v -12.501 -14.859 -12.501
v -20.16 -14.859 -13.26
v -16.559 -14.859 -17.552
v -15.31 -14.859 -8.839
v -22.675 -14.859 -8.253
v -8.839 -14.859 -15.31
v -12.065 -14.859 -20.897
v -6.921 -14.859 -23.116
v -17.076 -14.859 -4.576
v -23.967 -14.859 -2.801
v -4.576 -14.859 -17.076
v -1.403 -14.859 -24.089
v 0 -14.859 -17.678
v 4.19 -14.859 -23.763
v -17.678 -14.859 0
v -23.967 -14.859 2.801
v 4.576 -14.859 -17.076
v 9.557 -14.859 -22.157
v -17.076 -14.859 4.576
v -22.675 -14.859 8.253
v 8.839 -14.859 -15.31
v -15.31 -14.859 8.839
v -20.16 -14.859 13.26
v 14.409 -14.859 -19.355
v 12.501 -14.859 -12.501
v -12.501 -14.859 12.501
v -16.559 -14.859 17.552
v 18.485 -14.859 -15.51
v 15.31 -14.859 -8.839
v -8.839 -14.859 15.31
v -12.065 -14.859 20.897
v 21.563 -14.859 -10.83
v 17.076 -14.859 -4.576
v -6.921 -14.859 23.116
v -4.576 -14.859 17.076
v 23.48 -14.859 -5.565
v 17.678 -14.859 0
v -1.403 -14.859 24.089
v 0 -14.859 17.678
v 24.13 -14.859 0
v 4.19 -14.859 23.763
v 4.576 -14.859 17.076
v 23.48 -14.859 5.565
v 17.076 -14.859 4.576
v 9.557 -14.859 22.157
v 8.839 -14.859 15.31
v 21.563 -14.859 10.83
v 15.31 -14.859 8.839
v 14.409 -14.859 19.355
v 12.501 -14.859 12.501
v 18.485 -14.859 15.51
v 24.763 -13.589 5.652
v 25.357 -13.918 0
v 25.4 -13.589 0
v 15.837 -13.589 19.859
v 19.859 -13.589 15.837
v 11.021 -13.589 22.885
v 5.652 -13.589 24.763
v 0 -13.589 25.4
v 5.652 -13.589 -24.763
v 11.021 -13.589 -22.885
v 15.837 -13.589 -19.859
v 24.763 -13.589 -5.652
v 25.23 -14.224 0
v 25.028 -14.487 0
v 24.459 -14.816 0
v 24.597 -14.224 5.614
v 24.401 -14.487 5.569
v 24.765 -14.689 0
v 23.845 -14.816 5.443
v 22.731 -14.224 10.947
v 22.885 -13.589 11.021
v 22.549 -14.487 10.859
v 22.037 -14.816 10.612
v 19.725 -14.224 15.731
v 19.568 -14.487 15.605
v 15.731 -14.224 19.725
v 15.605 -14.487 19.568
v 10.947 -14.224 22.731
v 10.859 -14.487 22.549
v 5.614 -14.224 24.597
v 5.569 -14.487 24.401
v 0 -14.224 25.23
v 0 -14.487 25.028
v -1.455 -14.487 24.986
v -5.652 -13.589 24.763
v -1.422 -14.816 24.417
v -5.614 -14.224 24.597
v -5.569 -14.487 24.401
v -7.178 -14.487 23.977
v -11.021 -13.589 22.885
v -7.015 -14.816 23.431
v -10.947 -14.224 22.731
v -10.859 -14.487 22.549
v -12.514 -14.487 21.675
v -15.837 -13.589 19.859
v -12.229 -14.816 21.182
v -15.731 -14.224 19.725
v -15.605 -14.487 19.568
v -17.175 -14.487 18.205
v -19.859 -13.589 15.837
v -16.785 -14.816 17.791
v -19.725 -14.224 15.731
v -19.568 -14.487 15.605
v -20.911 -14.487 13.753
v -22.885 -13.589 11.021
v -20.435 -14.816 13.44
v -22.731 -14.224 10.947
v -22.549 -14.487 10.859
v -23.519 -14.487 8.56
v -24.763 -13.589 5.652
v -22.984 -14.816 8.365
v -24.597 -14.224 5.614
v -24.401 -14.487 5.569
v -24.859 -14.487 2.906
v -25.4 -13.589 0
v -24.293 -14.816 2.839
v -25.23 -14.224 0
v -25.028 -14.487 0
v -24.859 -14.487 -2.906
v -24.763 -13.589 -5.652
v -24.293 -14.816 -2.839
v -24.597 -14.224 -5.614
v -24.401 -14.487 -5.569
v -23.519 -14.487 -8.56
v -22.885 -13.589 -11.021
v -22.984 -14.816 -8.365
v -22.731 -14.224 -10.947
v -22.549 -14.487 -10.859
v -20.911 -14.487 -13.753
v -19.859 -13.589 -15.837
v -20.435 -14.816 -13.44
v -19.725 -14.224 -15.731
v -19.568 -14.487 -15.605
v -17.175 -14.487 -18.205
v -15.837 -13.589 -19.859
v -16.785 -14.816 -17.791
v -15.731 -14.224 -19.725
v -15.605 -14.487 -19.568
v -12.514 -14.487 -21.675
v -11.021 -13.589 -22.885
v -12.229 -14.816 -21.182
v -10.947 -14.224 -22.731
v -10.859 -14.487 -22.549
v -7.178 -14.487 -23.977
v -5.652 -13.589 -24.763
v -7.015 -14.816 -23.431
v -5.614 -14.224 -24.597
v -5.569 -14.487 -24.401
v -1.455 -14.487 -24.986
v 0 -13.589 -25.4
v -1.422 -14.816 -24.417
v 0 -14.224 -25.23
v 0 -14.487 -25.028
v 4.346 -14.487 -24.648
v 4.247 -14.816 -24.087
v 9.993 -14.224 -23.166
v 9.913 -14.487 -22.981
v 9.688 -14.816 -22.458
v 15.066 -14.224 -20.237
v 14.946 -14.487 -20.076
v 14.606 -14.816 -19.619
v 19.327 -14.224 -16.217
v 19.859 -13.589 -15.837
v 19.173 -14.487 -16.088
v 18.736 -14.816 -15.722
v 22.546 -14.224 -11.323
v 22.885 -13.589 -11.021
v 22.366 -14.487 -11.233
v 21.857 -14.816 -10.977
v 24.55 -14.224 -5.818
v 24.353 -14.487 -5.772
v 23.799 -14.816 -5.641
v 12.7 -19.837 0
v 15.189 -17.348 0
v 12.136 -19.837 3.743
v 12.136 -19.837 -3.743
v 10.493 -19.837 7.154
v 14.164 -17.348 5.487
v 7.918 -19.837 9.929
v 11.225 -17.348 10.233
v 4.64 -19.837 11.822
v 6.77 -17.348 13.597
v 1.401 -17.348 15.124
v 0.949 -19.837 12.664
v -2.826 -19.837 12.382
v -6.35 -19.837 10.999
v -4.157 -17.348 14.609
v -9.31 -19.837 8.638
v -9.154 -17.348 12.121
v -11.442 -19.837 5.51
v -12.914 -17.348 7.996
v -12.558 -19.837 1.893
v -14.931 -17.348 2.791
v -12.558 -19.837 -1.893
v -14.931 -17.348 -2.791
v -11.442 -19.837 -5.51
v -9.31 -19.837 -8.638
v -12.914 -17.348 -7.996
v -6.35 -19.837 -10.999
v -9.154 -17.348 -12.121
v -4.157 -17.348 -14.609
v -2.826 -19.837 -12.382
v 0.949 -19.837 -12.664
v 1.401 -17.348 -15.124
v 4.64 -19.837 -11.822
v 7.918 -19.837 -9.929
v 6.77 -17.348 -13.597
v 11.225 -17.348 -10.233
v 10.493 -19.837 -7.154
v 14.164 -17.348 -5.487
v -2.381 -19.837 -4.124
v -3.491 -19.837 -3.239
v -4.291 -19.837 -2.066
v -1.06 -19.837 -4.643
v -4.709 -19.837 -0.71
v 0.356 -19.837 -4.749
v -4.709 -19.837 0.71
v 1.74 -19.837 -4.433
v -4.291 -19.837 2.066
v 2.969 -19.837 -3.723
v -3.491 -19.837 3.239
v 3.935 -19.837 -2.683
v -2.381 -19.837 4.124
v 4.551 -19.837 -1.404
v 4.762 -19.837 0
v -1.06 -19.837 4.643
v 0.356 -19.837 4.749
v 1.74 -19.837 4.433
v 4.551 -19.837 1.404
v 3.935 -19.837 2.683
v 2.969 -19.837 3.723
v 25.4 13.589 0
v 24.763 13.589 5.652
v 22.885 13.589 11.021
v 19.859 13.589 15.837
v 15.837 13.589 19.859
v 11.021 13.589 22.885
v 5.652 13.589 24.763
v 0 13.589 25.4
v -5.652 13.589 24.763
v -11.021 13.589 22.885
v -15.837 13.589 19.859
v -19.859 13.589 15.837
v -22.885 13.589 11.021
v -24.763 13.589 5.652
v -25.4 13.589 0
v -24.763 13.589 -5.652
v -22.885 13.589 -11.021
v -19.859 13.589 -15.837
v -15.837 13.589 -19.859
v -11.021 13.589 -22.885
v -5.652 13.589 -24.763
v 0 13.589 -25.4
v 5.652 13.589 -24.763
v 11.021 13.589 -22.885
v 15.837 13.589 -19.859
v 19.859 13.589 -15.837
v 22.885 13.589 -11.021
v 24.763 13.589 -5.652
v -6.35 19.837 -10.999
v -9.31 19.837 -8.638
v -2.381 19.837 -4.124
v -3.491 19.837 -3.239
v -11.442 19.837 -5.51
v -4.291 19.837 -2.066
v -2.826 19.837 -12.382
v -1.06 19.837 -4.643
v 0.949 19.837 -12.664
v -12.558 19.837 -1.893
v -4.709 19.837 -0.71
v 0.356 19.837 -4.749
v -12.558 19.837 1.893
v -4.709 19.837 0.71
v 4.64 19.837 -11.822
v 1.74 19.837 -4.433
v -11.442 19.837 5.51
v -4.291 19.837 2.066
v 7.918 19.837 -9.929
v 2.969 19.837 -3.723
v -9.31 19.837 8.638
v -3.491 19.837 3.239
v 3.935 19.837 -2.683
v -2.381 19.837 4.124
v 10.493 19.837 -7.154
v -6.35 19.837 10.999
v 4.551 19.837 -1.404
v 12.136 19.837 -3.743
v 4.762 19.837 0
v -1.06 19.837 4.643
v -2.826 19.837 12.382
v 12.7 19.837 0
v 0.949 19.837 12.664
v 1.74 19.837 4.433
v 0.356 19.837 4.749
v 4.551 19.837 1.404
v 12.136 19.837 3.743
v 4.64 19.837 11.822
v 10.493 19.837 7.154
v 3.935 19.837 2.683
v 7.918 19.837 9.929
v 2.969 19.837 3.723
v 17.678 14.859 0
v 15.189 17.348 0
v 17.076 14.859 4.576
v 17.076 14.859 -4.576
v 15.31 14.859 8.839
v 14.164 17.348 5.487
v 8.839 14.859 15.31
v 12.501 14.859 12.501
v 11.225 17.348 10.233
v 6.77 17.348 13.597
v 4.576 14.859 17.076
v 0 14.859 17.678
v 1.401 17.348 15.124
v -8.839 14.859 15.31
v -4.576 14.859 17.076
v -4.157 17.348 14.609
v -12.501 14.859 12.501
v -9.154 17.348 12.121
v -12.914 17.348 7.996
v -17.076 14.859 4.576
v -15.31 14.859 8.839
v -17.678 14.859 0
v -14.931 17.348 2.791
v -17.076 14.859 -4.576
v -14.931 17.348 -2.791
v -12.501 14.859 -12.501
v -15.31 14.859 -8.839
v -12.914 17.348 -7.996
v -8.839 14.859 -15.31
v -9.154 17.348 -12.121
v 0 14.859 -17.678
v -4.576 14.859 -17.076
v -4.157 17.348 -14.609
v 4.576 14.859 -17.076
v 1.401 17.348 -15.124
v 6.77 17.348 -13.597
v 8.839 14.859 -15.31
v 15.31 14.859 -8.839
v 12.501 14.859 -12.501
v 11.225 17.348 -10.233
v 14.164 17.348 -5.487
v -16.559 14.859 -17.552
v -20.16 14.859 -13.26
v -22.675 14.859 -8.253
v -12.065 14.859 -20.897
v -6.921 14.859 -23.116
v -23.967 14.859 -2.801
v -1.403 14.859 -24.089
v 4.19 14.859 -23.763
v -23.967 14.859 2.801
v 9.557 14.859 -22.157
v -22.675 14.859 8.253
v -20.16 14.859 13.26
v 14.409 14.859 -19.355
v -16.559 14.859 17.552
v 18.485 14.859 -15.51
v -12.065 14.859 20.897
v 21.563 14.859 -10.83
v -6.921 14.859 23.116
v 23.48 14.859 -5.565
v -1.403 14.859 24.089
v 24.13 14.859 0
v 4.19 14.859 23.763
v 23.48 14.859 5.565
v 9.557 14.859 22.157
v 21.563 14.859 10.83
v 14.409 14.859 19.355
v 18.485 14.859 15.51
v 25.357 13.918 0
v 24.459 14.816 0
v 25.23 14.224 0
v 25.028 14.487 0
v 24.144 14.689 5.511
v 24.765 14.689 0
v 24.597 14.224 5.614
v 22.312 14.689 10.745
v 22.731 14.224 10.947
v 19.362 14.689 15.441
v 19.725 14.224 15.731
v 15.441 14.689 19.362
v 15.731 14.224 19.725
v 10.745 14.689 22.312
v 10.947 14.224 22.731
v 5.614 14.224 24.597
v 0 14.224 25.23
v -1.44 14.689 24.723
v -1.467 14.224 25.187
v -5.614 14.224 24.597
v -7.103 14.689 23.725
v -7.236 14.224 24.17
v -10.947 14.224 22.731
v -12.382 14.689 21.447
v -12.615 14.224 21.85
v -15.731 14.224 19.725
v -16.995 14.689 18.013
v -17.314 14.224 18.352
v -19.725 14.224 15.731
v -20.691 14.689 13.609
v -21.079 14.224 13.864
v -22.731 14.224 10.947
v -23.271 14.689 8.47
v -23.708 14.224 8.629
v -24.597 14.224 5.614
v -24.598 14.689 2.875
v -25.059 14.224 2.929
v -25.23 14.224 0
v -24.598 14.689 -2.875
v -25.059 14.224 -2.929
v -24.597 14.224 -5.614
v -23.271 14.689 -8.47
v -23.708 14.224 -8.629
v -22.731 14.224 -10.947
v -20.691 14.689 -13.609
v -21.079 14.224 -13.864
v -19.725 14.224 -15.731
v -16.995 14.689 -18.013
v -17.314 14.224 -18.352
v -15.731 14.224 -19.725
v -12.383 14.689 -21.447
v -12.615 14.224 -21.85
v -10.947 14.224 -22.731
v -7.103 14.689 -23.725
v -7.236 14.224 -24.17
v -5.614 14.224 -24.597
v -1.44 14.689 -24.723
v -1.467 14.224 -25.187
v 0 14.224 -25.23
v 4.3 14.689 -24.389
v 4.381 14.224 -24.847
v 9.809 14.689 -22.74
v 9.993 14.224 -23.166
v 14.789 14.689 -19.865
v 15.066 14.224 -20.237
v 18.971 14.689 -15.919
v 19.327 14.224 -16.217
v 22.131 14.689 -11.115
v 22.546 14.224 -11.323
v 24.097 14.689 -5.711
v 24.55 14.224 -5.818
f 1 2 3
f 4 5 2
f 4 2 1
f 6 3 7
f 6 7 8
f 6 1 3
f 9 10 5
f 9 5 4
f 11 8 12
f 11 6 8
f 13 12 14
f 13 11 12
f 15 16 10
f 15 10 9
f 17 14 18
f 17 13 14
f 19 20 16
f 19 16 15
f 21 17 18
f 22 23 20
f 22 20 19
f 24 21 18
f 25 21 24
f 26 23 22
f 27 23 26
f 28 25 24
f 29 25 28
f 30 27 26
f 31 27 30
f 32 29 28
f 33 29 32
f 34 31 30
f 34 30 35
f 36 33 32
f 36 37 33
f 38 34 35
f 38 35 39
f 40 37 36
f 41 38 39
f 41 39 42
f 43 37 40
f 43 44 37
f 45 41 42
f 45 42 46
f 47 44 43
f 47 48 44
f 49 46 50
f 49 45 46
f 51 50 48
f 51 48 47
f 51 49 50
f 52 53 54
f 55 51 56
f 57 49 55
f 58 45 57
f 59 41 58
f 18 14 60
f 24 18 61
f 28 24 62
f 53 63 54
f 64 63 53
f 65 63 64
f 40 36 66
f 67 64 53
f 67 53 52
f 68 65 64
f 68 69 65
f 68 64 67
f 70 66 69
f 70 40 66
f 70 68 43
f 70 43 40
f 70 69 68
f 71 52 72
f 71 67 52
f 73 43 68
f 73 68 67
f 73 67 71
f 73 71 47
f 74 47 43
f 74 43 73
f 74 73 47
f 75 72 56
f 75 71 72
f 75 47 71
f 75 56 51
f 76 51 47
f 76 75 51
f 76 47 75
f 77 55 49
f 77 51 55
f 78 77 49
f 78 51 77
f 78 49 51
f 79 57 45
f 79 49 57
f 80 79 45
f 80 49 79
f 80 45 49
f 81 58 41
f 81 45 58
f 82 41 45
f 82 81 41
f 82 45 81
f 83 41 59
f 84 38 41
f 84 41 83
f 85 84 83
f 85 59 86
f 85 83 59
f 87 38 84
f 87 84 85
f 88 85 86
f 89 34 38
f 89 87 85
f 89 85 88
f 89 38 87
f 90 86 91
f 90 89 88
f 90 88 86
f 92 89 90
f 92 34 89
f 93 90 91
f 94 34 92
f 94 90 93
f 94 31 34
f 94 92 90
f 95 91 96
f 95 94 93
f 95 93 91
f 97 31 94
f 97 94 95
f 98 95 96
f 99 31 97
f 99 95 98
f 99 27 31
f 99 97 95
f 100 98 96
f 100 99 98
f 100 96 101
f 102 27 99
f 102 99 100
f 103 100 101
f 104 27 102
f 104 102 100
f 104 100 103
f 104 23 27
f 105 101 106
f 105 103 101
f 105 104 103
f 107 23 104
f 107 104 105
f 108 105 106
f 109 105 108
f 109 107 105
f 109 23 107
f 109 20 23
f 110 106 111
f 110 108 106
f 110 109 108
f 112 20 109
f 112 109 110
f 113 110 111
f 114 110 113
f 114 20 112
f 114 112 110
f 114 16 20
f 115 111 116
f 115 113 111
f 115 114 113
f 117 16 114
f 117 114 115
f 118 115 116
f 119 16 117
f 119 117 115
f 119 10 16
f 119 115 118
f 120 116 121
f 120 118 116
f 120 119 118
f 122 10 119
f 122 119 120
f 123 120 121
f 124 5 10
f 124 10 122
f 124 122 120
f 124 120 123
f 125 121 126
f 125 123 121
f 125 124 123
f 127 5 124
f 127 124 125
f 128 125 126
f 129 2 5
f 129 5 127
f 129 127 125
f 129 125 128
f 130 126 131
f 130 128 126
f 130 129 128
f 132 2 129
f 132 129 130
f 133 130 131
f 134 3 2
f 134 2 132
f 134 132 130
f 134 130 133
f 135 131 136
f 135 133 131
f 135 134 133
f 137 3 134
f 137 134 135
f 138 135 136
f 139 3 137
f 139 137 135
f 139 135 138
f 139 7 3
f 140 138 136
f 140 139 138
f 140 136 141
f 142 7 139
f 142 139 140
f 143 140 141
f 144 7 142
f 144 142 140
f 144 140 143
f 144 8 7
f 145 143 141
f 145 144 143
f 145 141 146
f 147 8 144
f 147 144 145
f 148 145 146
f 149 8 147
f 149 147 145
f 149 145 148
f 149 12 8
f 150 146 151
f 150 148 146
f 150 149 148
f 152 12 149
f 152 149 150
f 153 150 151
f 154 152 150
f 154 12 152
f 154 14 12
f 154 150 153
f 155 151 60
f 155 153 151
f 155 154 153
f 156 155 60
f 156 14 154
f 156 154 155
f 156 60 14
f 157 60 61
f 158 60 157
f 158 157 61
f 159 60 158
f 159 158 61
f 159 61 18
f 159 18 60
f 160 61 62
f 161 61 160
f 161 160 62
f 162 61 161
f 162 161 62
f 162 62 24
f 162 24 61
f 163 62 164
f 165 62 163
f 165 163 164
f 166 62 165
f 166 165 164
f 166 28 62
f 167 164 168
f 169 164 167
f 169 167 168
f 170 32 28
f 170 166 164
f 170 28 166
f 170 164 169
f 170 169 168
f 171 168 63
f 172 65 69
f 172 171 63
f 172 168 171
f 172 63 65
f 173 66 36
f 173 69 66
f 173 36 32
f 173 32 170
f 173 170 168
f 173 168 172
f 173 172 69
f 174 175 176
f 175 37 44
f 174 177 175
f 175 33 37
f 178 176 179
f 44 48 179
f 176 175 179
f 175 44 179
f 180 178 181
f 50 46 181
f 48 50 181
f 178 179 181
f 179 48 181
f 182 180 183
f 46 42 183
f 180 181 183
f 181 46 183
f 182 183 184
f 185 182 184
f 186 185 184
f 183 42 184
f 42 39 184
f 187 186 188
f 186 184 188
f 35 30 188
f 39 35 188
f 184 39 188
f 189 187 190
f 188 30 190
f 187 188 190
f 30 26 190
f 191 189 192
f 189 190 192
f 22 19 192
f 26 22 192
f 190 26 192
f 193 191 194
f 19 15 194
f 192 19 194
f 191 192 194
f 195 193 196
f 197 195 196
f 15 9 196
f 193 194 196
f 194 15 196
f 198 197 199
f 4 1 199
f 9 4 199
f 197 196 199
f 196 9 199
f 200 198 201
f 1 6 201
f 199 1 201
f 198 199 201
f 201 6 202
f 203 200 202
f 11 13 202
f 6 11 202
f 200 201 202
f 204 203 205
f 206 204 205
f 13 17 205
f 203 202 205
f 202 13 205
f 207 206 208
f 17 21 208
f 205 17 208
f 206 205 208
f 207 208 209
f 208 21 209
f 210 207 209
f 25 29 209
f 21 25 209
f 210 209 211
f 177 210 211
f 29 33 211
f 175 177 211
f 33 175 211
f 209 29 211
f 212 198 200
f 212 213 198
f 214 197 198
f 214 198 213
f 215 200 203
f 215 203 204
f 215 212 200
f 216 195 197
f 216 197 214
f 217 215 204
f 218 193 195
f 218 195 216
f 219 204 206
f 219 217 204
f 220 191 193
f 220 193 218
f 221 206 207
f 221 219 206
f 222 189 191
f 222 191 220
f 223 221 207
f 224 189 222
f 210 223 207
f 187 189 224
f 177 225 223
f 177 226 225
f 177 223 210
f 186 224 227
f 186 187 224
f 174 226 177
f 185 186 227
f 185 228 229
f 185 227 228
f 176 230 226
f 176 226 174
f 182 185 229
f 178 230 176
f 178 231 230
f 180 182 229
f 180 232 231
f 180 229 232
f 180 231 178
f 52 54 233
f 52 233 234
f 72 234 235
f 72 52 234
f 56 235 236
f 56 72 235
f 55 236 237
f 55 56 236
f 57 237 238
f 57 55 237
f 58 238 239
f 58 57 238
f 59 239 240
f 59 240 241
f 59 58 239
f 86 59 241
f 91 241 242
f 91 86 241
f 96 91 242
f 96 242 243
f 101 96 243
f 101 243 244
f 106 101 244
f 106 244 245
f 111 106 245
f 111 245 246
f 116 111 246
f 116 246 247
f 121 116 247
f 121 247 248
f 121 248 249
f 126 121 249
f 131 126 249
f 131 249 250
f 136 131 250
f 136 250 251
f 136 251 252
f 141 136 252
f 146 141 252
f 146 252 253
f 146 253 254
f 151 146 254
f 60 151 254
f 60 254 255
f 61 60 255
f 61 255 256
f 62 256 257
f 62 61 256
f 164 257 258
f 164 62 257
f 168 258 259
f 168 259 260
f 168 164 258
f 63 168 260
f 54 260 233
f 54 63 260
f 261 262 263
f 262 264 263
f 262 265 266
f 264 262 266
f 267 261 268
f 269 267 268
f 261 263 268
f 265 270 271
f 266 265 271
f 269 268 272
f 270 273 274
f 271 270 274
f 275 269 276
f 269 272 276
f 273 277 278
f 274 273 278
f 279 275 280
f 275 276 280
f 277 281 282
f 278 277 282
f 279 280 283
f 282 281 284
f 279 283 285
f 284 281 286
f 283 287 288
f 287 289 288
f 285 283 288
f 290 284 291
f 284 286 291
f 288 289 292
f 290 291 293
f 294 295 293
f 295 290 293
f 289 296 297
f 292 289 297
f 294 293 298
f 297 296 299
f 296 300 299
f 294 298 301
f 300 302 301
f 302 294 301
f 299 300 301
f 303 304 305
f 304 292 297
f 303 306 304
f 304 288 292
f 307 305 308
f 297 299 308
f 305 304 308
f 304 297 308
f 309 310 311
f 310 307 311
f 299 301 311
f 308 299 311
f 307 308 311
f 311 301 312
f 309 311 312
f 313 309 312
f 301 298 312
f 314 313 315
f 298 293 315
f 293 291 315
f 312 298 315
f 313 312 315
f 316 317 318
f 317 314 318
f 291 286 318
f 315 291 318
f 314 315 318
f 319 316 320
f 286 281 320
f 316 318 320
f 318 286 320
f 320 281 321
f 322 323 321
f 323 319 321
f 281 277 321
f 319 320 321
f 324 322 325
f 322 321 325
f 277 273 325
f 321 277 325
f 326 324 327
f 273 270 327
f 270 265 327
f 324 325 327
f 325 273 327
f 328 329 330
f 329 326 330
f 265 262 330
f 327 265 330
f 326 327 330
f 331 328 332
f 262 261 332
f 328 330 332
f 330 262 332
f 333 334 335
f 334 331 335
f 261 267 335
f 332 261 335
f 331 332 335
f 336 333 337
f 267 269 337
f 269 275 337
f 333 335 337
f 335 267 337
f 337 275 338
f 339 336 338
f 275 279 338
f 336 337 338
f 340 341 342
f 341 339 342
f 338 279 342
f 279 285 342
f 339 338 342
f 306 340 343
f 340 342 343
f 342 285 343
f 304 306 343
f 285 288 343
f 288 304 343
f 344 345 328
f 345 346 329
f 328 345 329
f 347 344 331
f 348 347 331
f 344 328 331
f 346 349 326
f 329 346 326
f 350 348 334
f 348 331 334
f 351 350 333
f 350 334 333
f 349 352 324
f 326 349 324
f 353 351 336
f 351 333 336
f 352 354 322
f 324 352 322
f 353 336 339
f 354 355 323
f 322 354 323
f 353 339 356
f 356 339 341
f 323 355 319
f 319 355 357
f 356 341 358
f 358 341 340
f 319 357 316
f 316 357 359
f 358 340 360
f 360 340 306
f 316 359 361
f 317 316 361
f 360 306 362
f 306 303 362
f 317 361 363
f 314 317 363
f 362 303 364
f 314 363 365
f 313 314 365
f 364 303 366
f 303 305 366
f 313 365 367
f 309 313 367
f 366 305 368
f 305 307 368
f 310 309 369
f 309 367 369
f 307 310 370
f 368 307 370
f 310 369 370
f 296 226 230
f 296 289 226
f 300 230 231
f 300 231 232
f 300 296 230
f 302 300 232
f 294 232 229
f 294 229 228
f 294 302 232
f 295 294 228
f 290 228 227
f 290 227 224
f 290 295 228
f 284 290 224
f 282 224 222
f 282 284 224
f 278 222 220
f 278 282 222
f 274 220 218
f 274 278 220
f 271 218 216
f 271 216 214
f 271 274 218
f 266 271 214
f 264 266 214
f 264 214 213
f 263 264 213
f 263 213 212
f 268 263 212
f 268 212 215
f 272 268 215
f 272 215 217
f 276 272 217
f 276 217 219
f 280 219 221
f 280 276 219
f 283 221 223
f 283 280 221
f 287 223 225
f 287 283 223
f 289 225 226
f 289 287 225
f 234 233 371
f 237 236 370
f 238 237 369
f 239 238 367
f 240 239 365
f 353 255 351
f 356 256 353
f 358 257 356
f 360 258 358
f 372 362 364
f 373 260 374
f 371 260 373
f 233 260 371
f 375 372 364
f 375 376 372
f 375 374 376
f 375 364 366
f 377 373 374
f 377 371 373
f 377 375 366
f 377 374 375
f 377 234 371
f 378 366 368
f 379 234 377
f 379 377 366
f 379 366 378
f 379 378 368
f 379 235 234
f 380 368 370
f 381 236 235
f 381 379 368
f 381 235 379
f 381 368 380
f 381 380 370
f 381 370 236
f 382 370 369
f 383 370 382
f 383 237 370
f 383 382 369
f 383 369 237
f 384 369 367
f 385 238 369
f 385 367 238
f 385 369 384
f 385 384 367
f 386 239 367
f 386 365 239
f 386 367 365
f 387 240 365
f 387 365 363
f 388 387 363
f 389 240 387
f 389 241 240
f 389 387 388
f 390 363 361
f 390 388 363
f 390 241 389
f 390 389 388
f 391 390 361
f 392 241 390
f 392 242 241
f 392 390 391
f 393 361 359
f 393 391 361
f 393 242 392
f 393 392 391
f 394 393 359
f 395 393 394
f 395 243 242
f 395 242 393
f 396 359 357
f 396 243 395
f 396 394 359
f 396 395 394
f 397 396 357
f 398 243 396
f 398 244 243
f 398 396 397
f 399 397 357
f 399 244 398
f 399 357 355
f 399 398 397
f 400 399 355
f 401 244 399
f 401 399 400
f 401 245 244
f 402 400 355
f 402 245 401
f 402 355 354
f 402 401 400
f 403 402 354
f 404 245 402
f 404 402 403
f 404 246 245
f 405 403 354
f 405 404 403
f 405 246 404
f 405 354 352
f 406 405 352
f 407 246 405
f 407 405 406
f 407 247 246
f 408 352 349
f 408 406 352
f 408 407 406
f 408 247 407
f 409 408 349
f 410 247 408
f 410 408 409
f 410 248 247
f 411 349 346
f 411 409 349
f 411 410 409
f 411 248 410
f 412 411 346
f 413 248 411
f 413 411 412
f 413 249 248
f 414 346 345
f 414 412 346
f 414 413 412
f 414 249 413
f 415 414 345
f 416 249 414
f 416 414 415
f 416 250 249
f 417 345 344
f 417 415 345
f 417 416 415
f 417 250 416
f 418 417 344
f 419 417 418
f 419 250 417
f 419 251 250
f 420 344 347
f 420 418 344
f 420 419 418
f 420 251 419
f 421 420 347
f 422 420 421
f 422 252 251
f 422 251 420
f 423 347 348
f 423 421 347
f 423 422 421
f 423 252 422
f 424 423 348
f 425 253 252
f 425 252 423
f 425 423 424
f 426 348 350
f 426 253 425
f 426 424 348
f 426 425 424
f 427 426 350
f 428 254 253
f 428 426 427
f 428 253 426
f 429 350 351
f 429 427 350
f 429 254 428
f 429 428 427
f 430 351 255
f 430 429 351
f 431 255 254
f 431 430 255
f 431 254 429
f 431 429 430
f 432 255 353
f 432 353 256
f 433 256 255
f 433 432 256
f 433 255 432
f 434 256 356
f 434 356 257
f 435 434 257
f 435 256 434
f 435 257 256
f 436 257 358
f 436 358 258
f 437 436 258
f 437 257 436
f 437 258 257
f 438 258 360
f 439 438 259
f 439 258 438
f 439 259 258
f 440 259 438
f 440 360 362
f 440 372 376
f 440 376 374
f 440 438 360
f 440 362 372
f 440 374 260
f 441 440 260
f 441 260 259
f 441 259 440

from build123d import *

# Parameters (mm, degrees)
F0_R     = 19.05
F0_R_2   = 4.7625
F1_DEPTH = 19.8374
F0_R_3   = 25.4
F2_DEPTH = 14.859
F4_R     = 1.27


# Not quite as in the source:
# - a fillet or chamfer that OpenCascade refuses, or shapes differently, is made with other operations: its cross-section is extruded or revolved along the edge and cut away or added


with BuildPart() as f1:
    # F0 (on Front) → F1 (new body, symmetric)
    with BuildSketch(Plane.XZ):
        Circle(F0_R)
        Circle(F0_R_2, mode=Mode.SUBTRACT)
    extrude(amount=F1_DEPTH, both=True)

    # F0 (on Front) → F2 (join, symmetric)
    with BuildSketch(Plane.XZ):
        Circle(F0_R_3)
        Circle(F0_R, mode=Mode.SUBTRACT)
    extrude(amount=F2_DEPTH, both=True)

    # F3: chamfer of 6.35 on 2 edges, made by hand


with BuildPart() as f3_tool2:
    # F3_s3 → F3_t4 (revolve)
    with BuildSketch(Plane.XY):
        Polygon((12.7, -19.8374), (19.05, -13.4874), (19.05, -19.8374), align=None)
    revolve(axis=Axis((0, -19.8374, 0), (0, -1, 0)))

    split(bisect_by=Plane.XZ.offset(14.859), keep=Keep.TOP)


with BuildPart() as f1_1:
    add(f1.part)

    # F3_t1: cut F3_tool2
    add(f3_tool2.part, mode=Mode.SUBTRACT)


with BuildPart() as f3_tool7:
    # F3_s8 → F3_t9 (revolve)
    with BuildSketch(Plane.XY):
        Polygon((19.05, 13.4874), (12.7, 19.8374), (19.05, 19.8374), align=None)
    revolve(axis=Axis((0, 19.8374, 0), (0, -1, 0)))

    split(bisect_by=Plane.XZ.offset(-14.859), keep=Keep.BOTTOM)


with BuildPart() as f1_2:
    add(f1_1.part)

    # F3_t6: cut F3_tool7
    add(f3_tool7.part, mode=Mode.SUBTRACT)

    # F4
    f4_edges = [f1_2.edges().sort_by_distance(p)[0] for p in [
        (-25.4, -14.859, 0),
        (-25.4, 14.859, 0),
    ]]
    fillet(f4_edges, radius=F4_R)


solid = f1_2.part
